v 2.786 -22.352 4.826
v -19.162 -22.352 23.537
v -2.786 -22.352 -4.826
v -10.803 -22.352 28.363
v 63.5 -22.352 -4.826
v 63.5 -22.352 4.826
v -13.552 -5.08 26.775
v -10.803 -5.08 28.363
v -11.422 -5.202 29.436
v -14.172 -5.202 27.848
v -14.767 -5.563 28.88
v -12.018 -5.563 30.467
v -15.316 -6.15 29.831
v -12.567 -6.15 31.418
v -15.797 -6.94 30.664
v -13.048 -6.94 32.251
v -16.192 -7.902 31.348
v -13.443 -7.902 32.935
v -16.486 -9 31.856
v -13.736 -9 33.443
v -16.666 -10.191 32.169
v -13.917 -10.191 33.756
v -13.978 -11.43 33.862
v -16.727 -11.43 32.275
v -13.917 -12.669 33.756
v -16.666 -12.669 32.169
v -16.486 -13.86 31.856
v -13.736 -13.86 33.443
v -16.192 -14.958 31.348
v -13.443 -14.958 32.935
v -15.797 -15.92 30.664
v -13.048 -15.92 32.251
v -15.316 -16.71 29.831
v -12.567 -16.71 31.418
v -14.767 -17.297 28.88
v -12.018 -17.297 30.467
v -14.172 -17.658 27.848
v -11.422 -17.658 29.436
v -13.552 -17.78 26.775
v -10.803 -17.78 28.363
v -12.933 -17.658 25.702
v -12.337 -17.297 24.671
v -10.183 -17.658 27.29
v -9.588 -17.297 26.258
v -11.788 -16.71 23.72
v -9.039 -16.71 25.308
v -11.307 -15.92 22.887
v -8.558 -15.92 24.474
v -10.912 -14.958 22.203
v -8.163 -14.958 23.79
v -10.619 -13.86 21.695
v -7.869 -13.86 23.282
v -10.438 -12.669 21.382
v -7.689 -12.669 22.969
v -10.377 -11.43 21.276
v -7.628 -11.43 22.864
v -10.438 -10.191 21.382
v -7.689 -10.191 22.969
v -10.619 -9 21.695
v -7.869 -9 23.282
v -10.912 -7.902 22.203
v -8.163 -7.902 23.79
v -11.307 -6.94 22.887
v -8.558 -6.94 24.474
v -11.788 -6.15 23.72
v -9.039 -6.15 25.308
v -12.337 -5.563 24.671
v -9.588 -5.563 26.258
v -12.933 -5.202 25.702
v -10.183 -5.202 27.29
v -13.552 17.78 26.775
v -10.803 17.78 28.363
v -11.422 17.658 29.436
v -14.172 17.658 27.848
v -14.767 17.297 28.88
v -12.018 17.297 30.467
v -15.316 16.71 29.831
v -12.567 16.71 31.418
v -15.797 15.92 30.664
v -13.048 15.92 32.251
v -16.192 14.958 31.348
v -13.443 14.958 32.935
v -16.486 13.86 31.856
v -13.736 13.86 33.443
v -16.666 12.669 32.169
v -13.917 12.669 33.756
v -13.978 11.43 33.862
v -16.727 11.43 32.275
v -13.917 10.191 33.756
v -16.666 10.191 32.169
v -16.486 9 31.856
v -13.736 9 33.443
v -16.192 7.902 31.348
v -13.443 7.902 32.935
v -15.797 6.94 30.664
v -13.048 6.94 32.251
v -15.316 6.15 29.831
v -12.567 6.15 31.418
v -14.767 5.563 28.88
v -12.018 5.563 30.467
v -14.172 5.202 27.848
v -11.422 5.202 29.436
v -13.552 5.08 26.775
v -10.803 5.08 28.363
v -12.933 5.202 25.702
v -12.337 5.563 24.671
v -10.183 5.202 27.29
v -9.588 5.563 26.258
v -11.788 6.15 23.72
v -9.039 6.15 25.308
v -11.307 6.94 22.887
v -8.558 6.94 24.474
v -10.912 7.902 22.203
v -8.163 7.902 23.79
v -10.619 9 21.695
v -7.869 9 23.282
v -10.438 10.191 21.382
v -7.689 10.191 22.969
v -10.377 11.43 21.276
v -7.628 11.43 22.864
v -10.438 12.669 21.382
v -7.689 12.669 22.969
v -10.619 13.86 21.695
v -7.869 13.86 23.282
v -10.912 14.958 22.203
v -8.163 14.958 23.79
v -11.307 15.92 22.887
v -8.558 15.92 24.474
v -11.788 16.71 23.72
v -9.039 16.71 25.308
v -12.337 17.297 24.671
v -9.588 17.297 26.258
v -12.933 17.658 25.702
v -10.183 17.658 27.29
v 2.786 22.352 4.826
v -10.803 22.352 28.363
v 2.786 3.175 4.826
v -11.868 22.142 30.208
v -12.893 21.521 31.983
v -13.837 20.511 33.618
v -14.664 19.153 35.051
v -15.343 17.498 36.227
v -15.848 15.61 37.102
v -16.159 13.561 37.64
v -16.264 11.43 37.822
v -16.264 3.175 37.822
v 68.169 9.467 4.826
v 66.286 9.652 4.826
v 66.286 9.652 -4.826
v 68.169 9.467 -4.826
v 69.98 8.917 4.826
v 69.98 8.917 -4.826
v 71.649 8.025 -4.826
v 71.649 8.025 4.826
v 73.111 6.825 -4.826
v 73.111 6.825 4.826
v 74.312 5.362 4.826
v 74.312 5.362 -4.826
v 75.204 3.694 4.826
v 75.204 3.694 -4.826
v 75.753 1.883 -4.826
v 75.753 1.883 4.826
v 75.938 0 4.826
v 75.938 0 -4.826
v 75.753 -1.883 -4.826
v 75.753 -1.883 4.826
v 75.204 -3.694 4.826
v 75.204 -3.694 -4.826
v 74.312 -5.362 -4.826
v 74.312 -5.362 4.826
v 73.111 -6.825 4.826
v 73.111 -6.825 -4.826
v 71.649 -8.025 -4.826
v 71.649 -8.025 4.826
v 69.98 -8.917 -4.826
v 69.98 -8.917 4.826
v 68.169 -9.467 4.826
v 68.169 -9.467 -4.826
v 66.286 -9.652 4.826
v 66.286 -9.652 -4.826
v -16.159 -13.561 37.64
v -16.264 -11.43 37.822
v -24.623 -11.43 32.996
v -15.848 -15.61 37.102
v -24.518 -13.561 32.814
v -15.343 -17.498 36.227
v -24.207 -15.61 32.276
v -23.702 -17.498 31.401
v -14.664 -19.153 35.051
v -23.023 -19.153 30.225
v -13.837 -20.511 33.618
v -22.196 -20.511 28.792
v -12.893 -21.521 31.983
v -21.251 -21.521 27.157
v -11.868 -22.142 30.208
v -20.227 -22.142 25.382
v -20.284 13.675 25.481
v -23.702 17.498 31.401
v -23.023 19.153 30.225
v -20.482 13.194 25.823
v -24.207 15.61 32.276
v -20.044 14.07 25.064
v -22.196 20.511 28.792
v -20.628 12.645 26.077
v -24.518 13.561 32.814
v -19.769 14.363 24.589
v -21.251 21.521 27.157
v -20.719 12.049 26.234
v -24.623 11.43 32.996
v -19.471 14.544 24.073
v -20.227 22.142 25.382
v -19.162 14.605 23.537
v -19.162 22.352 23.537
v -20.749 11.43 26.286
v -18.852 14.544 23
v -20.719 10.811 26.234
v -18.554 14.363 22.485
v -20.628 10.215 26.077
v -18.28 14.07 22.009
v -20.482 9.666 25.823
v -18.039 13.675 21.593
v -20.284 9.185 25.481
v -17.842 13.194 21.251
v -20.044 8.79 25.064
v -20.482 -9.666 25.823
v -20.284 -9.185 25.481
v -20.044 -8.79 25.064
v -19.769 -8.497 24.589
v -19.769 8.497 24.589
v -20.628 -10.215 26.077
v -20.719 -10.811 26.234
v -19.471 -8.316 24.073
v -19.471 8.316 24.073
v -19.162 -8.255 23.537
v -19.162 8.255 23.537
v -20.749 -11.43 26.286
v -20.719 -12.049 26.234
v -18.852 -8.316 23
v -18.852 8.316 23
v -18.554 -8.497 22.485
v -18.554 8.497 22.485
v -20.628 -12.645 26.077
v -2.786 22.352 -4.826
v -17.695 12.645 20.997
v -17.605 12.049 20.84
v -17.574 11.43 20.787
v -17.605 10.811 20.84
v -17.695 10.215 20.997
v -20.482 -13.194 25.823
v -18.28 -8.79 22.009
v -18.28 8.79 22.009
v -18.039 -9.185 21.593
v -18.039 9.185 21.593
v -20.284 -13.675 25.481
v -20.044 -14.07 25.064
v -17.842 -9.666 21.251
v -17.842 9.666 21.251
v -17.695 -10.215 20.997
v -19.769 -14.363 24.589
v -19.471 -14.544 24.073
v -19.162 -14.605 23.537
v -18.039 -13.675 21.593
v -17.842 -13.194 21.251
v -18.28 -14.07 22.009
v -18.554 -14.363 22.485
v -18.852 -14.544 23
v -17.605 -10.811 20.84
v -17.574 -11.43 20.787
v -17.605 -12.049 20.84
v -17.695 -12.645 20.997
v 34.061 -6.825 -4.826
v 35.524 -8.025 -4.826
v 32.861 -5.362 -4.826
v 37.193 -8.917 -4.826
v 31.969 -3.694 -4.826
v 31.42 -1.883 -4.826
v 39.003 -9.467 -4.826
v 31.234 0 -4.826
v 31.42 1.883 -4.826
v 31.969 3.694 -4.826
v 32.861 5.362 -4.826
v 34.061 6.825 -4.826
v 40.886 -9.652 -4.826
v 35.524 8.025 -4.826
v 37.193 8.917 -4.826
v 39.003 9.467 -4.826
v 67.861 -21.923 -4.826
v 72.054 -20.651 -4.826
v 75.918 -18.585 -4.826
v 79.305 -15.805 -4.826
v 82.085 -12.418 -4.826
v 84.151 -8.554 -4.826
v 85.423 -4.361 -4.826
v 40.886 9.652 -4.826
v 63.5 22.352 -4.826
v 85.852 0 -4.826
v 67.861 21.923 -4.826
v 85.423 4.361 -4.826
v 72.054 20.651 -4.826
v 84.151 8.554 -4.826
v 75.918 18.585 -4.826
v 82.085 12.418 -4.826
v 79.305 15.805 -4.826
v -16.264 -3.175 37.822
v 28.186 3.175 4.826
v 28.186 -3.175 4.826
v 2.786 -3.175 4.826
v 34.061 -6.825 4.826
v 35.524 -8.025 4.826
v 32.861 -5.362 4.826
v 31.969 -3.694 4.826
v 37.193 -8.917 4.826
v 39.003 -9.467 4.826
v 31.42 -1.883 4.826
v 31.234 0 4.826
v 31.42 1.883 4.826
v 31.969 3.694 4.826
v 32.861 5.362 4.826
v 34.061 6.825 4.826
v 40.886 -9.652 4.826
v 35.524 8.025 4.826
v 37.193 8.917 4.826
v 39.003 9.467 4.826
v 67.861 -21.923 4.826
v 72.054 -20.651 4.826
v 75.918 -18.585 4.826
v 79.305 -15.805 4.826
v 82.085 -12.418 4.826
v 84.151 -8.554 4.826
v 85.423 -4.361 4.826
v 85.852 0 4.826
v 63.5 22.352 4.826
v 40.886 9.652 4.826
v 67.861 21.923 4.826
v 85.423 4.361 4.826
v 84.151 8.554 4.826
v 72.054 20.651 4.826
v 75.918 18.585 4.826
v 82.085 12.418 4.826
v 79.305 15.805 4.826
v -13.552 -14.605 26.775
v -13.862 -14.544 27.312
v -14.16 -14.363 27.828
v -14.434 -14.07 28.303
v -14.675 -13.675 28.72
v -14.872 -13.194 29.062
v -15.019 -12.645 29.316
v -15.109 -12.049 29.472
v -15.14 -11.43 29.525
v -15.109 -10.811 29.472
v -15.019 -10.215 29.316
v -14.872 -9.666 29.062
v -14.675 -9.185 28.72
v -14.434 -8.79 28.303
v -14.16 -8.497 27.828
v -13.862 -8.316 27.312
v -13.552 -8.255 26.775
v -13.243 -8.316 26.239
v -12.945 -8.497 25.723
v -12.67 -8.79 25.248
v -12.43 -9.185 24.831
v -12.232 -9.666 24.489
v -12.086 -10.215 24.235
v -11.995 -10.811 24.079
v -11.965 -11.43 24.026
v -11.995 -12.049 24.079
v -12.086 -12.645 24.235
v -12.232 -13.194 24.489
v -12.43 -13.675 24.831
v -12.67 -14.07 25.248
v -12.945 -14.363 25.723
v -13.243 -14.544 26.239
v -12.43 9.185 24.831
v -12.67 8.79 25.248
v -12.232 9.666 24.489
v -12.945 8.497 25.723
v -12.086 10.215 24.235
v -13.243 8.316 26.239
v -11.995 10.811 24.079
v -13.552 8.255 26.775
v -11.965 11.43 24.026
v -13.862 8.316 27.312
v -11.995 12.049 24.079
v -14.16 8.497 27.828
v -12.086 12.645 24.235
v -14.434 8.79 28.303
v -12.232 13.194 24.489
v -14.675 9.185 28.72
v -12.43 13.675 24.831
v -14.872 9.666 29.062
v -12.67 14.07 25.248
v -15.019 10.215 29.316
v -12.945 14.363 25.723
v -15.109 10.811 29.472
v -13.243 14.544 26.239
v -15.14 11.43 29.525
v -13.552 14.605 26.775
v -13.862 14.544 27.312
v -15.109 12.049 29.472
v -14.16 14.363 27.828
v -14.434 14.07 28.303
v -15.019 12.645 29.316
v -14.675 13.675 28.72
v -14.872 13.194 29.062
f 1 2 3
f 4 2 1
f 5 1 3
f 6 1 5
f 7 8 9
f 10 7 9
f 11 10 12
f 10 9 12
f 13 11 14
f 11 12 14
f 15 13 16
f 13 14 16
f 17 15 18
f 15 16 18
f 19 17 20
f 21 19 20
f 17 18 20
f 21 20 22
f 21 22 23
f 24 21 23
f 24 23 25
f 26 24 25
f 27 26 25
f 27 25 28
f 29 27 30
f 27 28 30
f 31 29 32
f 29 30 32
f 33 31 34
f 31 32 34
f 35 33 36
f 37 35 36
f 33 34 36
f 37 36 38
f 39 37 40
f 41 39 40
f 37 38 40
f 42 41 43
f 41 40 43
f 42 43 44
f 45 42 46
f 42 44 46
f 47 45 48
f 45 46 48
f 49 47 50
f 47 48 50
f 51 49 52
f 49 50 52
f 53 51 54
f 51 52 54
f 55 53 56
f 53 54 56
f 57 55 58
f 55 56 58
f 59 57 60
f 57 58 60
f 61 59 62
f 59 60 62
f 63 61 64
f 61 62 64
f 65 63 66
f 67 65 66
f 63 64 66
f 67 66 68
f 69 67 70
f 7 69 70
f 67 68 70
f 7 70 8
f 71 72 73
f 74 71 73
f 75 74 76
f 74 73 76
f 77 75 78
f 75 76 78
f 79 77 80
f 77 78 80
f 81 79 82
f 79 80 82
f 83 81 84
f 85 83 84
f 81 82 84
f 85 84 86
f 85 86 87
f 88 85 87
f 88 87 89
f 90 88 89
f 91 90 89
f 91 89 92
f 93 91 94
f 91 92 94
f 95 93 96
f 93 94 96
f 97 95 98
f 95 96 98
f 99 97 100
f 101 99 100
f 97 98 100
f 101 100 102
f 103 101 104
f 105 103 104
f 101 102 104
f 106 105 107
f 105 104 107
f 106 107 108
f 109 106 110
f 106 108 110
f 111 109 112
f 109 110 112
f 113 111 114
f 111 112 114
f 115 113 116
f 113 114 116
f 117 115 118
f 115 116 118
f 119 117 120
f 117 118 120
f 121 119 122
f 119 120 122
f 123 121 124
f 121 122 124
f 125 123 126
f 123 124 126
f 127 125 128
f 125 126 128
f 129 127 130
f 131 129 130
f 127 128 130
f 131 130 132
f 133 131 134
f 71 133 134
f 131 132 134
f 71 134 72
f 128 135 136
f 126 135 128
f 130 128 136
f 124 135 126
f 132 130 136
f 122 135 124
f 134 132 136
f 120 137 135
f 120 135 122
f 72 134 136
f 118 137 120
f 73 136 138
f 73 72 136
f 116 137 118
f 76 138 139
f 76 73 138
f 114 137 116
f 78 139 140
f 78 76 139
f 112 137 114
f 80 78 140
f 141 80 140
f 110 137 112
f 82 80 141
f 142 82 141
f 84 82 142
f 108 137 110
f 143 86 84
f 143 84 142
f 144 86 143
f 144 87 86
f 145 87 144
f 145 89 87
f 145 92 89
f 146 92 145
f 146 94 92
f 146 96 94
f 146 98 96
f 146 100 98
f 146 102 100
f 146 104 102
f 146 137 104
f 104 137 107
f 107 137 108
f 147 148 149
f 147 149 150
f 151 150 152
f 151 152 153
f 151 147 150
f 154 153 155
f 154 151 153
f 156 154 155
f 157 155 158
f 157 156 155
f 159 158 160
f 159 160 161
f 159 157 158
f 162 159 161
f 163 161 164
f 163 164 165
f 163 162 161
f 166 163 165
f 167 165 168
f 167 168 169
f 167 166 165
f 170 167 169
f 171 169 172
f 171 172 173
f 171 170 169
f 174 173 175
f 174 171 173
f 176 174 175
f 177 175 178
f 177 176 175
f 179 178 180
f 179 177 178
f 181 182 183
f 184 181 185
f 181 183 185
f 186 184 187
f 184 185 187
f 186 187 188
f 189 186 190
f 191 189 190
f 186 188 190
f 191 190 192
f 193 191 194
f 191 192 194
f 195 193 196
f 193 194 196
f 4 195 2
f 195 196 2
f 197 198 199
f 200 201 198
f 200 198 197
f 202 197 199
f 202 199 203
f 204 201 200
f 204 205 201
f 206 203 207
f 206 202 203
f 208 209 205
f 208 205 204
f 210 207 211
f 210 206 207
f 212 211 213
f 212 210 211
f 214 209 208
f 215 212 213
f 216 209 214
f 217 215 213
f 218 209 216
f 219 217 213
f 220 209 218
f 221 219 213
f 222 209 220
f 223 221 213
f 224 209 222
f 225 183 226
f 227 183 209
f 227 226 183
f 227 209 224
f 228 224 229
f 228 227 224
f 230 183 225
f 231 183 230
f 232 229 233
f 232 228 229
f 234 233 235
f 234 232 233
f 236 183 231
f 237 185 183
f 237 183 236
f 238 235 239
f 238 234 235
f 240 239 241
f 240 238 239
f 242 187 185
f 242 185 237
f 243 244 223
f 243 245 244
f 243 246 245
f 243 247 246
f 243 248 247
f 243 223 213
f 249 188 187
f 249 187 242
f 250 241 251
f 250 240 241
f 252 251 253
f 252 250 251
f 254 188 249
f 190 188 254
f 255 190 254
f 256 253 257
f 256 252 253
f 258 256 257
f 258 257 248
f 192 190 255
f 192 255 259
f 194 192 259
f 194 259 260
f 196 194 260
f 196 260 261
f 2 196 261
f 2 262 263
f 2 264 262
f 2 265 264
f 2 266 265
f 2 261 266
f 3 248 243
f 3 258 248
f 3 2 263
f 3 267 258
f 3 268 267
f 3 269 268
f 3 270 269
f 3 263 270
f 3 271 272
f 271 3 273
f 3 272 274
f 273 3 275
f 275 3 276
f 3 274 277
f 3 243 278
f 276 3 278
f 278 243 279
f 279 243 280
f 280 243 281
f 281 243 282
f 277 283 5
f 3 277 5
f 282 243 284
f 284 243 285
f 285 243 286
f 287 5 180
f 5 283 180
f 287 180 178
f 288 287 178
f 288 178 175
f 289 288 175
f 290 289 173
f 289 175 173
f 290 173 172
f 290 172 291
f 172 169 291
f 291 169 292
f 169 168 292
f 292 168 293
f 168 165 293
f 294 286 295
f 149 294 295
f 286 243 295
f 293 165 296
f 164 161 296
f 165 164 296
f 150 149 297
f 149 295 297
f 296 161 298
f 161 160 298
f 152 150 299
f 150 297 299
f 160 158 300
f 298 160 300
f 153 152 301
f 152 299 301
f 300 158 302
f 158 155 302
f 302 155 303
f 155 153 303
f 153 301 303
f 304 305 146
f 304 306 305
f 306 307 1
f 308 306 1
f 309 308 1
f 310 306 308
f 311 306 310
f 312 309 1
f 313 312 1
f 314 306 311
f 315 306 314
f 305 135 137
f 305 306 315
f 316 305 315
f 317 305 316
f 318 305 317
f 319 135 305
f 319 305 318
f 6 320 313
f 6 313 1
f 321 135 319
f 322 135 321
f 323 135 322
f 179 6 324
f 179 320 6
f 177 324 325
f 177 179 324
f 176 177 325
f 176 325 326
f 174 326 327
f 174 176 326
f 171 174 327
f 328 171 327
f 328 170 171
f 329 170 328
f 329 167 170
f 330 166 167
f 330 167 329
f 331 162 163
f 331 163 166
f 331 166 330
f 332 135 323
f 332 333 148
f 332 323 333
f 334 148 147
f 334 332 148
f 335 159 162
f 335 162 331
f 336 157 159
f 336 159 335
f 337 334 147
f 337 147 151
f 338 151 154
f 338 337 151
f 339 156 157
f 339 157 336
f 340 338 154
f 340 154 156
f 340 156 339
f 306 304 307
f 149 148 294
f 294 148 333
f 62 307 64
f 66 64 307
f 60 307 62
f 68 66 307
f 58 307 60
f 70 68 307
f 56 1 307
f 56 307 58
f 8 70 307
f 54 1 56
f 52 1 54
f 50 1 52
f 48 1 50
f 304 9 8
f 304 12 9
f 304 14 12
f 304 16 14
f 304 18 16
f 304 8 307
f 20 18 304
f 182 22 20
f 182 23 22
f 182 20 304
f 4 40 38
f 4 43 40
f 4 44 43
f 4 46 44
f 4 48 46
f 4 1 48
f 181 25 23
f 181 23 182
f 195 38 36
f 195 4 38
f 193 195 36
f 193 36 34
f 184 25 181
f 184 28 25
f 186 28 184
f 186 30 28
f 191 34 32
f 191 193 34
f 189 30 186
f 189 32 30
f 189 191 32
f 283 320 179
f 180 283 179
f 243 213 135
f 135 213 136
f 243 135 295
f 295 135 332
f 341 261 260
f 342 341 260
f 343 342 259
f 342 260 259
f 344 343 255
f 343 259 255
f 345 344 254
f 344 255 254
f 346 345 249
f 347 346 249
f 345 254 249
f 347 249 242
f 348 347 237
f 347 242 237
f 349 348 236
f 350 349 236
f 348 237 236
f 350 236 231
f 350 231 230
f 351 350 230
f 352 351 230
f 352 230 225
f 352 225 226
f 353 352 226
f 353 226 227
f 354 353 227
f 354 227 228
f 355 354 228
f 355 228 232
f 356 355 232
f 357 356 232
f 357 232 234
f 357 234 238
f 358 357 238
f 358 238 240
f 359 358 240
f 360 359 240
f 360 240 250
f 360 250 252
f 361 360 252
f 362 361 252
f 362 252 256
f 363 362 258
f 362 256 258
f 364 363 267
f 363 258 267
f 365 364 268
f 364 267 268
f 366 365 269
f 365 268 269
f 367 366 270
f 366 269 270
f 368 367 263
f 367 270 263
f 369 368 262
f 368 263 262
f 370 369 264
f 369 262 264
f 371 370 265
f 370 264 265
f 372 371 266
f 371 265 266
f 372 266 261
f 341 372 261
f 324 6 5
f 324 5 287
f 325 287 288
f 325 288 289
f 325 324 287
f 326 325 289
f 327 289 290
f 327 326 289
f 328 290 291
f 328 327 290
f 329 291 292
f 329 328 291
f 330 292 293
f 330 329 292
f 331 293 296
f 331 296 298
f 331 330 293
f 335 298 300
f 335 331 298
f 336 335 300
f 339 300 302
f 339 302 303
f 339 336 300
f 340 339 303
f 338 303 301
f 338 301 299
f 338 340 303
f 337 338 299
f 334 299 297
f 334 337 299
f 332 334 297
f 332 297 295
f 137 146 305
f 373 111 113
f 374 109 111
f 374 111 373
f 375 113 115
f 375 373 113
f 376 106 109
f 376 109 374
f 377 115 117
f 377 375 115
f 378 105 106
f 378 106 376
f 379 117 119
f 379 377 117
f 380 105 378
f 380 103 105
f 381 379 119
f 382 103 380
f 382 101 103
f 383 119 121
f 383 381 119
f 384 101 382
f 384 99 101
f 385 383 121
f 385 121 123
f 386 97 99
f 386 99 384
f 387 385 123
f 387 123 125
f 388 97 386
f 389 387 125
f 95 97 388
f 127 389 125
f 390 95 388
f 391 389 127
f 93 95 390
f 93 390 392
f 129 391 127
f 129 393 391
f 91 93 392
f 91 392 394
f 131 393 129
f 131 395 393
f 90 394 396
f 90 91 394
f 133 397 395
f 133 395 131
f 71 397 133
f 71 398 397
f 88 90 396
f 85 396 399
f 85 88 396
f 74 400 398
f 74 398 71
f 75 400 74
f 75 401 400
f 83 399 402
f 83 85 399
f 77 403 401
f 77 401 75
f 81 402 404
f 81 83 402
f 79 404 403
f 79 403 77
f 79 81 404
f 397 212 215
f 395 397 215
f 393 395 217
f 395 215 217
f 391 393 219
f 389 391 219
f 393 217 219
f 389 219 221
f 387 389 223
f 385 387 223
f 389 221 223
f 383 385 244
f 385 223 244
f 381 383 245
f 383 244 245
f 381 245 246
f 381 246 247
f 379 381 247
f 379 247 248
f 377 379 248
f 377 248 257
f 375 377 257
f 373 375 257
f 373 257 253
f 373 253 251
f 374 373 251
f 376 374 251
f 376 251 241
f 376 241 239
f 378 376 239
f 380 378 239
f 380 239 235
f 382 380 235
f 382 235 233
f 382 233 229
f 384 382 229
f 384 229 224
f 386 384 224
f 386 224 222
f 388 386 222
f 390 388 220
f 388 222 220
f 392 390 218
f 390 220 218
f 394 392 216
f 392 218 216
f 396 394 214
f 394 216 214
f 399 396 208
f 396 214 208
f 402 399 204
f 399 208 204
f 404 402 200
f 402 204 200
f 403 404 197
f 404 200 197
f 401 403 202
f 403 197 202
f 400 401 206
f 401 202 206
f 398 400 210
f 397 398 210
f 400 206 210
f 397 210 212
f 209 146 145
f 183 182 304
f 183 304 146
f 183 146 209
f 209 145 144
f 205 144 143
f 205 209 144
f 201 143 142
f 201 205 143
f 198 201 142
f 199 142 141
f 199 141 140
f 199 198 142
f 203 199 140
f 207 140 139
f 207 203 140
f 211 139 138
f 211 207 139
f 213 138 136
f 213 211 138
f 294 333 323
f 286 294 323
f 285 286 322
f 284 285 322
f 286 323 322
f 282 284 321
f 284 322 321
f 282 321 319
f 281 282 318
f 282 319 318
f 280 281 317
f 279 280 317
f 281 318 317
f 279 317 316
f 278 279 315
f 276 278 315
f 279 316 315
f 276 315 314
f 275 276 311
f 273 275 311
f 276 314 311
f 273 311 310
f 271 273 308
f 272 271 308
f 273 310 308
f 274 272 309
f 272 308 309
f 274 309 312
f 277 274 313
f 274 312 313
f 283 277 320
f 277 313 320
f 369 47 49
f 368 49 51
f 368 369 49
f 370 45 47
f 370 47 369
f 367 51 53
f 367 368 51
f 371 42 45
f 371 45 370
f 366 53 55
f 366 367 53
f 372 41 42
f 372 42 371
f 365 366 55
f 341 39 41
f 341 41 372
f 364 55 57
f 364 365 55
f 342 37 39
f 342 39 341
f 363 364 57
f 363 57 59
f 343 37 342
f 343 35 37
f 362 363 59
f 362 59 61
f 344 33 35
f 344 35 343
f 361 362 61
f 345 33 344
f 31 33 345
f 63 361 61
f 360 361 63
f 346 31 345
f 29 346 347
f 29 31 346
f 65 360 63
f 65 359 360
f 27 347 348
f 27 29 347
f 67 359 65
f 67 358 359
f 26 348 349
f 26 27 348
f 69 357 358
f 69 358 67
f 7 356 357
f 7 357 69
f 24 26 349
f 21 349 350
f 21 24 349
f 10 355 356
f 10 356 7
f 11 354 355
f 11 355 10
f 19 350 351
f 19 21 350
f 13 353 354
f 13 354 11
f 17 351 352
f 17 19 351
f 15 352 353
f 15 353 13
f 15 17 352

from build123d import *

# Parameters (mm, degrees)
F1_DEPTH  = 22.352
F2_DEPTH  = 3.175
F3_R      = 10.922
F5_DEPTH  = 9.652
F6_DEPTH  = 25.4
F7_R      = 3.175
F9_DEPTH  = 9.652
F8_R      = 6.35
F10_DEPTH = 3.175


with BuildPart() as f1:
    # F0 (on Front) → F1 (new body, symmetric)
    with BuildSketch(Plane.XZ):
        Polygon((28.1862923991, 4.826), (2.7862923991, 4.826), (-16.2637076009, 37.8215678842), (-24.6225847982, 32.9955678842), (-2.7862923991, -4.826), (63.5, -4.826), (63.5, 4.826), align=None)
    extrude(amount=F1_DEPTH, both=True)

    # F0 (on Front) → F2 (join, symmetric)
    with BuildSketch(Plane.XZ):
        Polygon((-16.2637076009, 37.8215678842), (2.7862923991, 4.826), (28.1862923991, 4.826), align=None)
    extrude(amount=F2_DEPTH, both=True)

    # F3
    f3_edges = [f1.edges().sort_by_distance(p)[0] for p in [
        (-20.443146, -22.352, 35.408568),
        (-20.443146, 22.352, 35.408568),
    ]]
    fillet(f3_edges, radius=F3_R)

    # F4 (on face) → F5 (join)
    with BuildSketch(Plane.XY.offset(4.826)):
        with BuildLine():
            Line((63.5, -9.652), (63.5, -22.352))
            ThreePointArc((63.5, -22.352), (85.852, 0), (63.5, 22.352))
            Line((63.5, 22.352), (63.5, 9.652))
            Line((63.5, 9.652), (66.2862923991, 9.652))
            ThreePointArc((66.2862923991, 9.652), (75.9382923991, 0), (66.2862923991, -9.652))
            Line((66.2862923991, -9.652), (63.5, -9.652))
        make_face()
    extrude(amount=-F5_DEPTH)

    # F4 (on face) → F6 (cut)
    with BuildSketch(Plane.XY.offset(4.826)):
        with BuildLine():
            Line((40.8862923991, -9.652), (63.5, -9.652))
            Line((63.5, -9.652), (63.5, 9.652))
            Line((63.5, 9.652), (40.8862923991, 9.652))
            ThreePointArc((40.8862923991, 9.652), (31.2342923991, 0), (40.8862923991, -9.652))
        make_face()
    extrude(amount=-F6_DEPTH, mode=Mode.SUBTRACT)

    # F7 (on face) → F9 (cut, through all)
    with BuildSketch(Plane(origin=(-4.1794385987, 0, -2.413), x_dir=(0, -1, 0), z_dir=(-0.8660254038, 0, -0.5))):
        with Locations((11.43, 29.9642923991)):
            Circle(F7_R)
        with BuildLine():
            ThreePointArc((-8.255, 29.9642923991), (-11.43, 33.1392923991), (-14.605, 29.9642923991))
            ThreePointArc((-14.605, 29.9642923991), (-11.43, 26.7892923991), (-8.255, 29.9642923991))
        make_face()
    extrude(amount=-F9_DEPTH, mode=Mode.SUBTRACT)

    # F8 (on face) → F10 (cut)
    with BuildSketch(Plane(origin=(4.1794385987, 0, 2.413), x_dir=(0, 1, 0), z_dir=(0.8660254038, 0, 0.5))):
        with Locations((-11.43, 29.9642923991)):
            Circle(F8_R)
        with Locations((11.43, 29.9642923991)):
            Circle(F8_R)
    extrude(amount=-F10_DEPTH, mode=Mode.SUBTRACT)


solid = f1.part
